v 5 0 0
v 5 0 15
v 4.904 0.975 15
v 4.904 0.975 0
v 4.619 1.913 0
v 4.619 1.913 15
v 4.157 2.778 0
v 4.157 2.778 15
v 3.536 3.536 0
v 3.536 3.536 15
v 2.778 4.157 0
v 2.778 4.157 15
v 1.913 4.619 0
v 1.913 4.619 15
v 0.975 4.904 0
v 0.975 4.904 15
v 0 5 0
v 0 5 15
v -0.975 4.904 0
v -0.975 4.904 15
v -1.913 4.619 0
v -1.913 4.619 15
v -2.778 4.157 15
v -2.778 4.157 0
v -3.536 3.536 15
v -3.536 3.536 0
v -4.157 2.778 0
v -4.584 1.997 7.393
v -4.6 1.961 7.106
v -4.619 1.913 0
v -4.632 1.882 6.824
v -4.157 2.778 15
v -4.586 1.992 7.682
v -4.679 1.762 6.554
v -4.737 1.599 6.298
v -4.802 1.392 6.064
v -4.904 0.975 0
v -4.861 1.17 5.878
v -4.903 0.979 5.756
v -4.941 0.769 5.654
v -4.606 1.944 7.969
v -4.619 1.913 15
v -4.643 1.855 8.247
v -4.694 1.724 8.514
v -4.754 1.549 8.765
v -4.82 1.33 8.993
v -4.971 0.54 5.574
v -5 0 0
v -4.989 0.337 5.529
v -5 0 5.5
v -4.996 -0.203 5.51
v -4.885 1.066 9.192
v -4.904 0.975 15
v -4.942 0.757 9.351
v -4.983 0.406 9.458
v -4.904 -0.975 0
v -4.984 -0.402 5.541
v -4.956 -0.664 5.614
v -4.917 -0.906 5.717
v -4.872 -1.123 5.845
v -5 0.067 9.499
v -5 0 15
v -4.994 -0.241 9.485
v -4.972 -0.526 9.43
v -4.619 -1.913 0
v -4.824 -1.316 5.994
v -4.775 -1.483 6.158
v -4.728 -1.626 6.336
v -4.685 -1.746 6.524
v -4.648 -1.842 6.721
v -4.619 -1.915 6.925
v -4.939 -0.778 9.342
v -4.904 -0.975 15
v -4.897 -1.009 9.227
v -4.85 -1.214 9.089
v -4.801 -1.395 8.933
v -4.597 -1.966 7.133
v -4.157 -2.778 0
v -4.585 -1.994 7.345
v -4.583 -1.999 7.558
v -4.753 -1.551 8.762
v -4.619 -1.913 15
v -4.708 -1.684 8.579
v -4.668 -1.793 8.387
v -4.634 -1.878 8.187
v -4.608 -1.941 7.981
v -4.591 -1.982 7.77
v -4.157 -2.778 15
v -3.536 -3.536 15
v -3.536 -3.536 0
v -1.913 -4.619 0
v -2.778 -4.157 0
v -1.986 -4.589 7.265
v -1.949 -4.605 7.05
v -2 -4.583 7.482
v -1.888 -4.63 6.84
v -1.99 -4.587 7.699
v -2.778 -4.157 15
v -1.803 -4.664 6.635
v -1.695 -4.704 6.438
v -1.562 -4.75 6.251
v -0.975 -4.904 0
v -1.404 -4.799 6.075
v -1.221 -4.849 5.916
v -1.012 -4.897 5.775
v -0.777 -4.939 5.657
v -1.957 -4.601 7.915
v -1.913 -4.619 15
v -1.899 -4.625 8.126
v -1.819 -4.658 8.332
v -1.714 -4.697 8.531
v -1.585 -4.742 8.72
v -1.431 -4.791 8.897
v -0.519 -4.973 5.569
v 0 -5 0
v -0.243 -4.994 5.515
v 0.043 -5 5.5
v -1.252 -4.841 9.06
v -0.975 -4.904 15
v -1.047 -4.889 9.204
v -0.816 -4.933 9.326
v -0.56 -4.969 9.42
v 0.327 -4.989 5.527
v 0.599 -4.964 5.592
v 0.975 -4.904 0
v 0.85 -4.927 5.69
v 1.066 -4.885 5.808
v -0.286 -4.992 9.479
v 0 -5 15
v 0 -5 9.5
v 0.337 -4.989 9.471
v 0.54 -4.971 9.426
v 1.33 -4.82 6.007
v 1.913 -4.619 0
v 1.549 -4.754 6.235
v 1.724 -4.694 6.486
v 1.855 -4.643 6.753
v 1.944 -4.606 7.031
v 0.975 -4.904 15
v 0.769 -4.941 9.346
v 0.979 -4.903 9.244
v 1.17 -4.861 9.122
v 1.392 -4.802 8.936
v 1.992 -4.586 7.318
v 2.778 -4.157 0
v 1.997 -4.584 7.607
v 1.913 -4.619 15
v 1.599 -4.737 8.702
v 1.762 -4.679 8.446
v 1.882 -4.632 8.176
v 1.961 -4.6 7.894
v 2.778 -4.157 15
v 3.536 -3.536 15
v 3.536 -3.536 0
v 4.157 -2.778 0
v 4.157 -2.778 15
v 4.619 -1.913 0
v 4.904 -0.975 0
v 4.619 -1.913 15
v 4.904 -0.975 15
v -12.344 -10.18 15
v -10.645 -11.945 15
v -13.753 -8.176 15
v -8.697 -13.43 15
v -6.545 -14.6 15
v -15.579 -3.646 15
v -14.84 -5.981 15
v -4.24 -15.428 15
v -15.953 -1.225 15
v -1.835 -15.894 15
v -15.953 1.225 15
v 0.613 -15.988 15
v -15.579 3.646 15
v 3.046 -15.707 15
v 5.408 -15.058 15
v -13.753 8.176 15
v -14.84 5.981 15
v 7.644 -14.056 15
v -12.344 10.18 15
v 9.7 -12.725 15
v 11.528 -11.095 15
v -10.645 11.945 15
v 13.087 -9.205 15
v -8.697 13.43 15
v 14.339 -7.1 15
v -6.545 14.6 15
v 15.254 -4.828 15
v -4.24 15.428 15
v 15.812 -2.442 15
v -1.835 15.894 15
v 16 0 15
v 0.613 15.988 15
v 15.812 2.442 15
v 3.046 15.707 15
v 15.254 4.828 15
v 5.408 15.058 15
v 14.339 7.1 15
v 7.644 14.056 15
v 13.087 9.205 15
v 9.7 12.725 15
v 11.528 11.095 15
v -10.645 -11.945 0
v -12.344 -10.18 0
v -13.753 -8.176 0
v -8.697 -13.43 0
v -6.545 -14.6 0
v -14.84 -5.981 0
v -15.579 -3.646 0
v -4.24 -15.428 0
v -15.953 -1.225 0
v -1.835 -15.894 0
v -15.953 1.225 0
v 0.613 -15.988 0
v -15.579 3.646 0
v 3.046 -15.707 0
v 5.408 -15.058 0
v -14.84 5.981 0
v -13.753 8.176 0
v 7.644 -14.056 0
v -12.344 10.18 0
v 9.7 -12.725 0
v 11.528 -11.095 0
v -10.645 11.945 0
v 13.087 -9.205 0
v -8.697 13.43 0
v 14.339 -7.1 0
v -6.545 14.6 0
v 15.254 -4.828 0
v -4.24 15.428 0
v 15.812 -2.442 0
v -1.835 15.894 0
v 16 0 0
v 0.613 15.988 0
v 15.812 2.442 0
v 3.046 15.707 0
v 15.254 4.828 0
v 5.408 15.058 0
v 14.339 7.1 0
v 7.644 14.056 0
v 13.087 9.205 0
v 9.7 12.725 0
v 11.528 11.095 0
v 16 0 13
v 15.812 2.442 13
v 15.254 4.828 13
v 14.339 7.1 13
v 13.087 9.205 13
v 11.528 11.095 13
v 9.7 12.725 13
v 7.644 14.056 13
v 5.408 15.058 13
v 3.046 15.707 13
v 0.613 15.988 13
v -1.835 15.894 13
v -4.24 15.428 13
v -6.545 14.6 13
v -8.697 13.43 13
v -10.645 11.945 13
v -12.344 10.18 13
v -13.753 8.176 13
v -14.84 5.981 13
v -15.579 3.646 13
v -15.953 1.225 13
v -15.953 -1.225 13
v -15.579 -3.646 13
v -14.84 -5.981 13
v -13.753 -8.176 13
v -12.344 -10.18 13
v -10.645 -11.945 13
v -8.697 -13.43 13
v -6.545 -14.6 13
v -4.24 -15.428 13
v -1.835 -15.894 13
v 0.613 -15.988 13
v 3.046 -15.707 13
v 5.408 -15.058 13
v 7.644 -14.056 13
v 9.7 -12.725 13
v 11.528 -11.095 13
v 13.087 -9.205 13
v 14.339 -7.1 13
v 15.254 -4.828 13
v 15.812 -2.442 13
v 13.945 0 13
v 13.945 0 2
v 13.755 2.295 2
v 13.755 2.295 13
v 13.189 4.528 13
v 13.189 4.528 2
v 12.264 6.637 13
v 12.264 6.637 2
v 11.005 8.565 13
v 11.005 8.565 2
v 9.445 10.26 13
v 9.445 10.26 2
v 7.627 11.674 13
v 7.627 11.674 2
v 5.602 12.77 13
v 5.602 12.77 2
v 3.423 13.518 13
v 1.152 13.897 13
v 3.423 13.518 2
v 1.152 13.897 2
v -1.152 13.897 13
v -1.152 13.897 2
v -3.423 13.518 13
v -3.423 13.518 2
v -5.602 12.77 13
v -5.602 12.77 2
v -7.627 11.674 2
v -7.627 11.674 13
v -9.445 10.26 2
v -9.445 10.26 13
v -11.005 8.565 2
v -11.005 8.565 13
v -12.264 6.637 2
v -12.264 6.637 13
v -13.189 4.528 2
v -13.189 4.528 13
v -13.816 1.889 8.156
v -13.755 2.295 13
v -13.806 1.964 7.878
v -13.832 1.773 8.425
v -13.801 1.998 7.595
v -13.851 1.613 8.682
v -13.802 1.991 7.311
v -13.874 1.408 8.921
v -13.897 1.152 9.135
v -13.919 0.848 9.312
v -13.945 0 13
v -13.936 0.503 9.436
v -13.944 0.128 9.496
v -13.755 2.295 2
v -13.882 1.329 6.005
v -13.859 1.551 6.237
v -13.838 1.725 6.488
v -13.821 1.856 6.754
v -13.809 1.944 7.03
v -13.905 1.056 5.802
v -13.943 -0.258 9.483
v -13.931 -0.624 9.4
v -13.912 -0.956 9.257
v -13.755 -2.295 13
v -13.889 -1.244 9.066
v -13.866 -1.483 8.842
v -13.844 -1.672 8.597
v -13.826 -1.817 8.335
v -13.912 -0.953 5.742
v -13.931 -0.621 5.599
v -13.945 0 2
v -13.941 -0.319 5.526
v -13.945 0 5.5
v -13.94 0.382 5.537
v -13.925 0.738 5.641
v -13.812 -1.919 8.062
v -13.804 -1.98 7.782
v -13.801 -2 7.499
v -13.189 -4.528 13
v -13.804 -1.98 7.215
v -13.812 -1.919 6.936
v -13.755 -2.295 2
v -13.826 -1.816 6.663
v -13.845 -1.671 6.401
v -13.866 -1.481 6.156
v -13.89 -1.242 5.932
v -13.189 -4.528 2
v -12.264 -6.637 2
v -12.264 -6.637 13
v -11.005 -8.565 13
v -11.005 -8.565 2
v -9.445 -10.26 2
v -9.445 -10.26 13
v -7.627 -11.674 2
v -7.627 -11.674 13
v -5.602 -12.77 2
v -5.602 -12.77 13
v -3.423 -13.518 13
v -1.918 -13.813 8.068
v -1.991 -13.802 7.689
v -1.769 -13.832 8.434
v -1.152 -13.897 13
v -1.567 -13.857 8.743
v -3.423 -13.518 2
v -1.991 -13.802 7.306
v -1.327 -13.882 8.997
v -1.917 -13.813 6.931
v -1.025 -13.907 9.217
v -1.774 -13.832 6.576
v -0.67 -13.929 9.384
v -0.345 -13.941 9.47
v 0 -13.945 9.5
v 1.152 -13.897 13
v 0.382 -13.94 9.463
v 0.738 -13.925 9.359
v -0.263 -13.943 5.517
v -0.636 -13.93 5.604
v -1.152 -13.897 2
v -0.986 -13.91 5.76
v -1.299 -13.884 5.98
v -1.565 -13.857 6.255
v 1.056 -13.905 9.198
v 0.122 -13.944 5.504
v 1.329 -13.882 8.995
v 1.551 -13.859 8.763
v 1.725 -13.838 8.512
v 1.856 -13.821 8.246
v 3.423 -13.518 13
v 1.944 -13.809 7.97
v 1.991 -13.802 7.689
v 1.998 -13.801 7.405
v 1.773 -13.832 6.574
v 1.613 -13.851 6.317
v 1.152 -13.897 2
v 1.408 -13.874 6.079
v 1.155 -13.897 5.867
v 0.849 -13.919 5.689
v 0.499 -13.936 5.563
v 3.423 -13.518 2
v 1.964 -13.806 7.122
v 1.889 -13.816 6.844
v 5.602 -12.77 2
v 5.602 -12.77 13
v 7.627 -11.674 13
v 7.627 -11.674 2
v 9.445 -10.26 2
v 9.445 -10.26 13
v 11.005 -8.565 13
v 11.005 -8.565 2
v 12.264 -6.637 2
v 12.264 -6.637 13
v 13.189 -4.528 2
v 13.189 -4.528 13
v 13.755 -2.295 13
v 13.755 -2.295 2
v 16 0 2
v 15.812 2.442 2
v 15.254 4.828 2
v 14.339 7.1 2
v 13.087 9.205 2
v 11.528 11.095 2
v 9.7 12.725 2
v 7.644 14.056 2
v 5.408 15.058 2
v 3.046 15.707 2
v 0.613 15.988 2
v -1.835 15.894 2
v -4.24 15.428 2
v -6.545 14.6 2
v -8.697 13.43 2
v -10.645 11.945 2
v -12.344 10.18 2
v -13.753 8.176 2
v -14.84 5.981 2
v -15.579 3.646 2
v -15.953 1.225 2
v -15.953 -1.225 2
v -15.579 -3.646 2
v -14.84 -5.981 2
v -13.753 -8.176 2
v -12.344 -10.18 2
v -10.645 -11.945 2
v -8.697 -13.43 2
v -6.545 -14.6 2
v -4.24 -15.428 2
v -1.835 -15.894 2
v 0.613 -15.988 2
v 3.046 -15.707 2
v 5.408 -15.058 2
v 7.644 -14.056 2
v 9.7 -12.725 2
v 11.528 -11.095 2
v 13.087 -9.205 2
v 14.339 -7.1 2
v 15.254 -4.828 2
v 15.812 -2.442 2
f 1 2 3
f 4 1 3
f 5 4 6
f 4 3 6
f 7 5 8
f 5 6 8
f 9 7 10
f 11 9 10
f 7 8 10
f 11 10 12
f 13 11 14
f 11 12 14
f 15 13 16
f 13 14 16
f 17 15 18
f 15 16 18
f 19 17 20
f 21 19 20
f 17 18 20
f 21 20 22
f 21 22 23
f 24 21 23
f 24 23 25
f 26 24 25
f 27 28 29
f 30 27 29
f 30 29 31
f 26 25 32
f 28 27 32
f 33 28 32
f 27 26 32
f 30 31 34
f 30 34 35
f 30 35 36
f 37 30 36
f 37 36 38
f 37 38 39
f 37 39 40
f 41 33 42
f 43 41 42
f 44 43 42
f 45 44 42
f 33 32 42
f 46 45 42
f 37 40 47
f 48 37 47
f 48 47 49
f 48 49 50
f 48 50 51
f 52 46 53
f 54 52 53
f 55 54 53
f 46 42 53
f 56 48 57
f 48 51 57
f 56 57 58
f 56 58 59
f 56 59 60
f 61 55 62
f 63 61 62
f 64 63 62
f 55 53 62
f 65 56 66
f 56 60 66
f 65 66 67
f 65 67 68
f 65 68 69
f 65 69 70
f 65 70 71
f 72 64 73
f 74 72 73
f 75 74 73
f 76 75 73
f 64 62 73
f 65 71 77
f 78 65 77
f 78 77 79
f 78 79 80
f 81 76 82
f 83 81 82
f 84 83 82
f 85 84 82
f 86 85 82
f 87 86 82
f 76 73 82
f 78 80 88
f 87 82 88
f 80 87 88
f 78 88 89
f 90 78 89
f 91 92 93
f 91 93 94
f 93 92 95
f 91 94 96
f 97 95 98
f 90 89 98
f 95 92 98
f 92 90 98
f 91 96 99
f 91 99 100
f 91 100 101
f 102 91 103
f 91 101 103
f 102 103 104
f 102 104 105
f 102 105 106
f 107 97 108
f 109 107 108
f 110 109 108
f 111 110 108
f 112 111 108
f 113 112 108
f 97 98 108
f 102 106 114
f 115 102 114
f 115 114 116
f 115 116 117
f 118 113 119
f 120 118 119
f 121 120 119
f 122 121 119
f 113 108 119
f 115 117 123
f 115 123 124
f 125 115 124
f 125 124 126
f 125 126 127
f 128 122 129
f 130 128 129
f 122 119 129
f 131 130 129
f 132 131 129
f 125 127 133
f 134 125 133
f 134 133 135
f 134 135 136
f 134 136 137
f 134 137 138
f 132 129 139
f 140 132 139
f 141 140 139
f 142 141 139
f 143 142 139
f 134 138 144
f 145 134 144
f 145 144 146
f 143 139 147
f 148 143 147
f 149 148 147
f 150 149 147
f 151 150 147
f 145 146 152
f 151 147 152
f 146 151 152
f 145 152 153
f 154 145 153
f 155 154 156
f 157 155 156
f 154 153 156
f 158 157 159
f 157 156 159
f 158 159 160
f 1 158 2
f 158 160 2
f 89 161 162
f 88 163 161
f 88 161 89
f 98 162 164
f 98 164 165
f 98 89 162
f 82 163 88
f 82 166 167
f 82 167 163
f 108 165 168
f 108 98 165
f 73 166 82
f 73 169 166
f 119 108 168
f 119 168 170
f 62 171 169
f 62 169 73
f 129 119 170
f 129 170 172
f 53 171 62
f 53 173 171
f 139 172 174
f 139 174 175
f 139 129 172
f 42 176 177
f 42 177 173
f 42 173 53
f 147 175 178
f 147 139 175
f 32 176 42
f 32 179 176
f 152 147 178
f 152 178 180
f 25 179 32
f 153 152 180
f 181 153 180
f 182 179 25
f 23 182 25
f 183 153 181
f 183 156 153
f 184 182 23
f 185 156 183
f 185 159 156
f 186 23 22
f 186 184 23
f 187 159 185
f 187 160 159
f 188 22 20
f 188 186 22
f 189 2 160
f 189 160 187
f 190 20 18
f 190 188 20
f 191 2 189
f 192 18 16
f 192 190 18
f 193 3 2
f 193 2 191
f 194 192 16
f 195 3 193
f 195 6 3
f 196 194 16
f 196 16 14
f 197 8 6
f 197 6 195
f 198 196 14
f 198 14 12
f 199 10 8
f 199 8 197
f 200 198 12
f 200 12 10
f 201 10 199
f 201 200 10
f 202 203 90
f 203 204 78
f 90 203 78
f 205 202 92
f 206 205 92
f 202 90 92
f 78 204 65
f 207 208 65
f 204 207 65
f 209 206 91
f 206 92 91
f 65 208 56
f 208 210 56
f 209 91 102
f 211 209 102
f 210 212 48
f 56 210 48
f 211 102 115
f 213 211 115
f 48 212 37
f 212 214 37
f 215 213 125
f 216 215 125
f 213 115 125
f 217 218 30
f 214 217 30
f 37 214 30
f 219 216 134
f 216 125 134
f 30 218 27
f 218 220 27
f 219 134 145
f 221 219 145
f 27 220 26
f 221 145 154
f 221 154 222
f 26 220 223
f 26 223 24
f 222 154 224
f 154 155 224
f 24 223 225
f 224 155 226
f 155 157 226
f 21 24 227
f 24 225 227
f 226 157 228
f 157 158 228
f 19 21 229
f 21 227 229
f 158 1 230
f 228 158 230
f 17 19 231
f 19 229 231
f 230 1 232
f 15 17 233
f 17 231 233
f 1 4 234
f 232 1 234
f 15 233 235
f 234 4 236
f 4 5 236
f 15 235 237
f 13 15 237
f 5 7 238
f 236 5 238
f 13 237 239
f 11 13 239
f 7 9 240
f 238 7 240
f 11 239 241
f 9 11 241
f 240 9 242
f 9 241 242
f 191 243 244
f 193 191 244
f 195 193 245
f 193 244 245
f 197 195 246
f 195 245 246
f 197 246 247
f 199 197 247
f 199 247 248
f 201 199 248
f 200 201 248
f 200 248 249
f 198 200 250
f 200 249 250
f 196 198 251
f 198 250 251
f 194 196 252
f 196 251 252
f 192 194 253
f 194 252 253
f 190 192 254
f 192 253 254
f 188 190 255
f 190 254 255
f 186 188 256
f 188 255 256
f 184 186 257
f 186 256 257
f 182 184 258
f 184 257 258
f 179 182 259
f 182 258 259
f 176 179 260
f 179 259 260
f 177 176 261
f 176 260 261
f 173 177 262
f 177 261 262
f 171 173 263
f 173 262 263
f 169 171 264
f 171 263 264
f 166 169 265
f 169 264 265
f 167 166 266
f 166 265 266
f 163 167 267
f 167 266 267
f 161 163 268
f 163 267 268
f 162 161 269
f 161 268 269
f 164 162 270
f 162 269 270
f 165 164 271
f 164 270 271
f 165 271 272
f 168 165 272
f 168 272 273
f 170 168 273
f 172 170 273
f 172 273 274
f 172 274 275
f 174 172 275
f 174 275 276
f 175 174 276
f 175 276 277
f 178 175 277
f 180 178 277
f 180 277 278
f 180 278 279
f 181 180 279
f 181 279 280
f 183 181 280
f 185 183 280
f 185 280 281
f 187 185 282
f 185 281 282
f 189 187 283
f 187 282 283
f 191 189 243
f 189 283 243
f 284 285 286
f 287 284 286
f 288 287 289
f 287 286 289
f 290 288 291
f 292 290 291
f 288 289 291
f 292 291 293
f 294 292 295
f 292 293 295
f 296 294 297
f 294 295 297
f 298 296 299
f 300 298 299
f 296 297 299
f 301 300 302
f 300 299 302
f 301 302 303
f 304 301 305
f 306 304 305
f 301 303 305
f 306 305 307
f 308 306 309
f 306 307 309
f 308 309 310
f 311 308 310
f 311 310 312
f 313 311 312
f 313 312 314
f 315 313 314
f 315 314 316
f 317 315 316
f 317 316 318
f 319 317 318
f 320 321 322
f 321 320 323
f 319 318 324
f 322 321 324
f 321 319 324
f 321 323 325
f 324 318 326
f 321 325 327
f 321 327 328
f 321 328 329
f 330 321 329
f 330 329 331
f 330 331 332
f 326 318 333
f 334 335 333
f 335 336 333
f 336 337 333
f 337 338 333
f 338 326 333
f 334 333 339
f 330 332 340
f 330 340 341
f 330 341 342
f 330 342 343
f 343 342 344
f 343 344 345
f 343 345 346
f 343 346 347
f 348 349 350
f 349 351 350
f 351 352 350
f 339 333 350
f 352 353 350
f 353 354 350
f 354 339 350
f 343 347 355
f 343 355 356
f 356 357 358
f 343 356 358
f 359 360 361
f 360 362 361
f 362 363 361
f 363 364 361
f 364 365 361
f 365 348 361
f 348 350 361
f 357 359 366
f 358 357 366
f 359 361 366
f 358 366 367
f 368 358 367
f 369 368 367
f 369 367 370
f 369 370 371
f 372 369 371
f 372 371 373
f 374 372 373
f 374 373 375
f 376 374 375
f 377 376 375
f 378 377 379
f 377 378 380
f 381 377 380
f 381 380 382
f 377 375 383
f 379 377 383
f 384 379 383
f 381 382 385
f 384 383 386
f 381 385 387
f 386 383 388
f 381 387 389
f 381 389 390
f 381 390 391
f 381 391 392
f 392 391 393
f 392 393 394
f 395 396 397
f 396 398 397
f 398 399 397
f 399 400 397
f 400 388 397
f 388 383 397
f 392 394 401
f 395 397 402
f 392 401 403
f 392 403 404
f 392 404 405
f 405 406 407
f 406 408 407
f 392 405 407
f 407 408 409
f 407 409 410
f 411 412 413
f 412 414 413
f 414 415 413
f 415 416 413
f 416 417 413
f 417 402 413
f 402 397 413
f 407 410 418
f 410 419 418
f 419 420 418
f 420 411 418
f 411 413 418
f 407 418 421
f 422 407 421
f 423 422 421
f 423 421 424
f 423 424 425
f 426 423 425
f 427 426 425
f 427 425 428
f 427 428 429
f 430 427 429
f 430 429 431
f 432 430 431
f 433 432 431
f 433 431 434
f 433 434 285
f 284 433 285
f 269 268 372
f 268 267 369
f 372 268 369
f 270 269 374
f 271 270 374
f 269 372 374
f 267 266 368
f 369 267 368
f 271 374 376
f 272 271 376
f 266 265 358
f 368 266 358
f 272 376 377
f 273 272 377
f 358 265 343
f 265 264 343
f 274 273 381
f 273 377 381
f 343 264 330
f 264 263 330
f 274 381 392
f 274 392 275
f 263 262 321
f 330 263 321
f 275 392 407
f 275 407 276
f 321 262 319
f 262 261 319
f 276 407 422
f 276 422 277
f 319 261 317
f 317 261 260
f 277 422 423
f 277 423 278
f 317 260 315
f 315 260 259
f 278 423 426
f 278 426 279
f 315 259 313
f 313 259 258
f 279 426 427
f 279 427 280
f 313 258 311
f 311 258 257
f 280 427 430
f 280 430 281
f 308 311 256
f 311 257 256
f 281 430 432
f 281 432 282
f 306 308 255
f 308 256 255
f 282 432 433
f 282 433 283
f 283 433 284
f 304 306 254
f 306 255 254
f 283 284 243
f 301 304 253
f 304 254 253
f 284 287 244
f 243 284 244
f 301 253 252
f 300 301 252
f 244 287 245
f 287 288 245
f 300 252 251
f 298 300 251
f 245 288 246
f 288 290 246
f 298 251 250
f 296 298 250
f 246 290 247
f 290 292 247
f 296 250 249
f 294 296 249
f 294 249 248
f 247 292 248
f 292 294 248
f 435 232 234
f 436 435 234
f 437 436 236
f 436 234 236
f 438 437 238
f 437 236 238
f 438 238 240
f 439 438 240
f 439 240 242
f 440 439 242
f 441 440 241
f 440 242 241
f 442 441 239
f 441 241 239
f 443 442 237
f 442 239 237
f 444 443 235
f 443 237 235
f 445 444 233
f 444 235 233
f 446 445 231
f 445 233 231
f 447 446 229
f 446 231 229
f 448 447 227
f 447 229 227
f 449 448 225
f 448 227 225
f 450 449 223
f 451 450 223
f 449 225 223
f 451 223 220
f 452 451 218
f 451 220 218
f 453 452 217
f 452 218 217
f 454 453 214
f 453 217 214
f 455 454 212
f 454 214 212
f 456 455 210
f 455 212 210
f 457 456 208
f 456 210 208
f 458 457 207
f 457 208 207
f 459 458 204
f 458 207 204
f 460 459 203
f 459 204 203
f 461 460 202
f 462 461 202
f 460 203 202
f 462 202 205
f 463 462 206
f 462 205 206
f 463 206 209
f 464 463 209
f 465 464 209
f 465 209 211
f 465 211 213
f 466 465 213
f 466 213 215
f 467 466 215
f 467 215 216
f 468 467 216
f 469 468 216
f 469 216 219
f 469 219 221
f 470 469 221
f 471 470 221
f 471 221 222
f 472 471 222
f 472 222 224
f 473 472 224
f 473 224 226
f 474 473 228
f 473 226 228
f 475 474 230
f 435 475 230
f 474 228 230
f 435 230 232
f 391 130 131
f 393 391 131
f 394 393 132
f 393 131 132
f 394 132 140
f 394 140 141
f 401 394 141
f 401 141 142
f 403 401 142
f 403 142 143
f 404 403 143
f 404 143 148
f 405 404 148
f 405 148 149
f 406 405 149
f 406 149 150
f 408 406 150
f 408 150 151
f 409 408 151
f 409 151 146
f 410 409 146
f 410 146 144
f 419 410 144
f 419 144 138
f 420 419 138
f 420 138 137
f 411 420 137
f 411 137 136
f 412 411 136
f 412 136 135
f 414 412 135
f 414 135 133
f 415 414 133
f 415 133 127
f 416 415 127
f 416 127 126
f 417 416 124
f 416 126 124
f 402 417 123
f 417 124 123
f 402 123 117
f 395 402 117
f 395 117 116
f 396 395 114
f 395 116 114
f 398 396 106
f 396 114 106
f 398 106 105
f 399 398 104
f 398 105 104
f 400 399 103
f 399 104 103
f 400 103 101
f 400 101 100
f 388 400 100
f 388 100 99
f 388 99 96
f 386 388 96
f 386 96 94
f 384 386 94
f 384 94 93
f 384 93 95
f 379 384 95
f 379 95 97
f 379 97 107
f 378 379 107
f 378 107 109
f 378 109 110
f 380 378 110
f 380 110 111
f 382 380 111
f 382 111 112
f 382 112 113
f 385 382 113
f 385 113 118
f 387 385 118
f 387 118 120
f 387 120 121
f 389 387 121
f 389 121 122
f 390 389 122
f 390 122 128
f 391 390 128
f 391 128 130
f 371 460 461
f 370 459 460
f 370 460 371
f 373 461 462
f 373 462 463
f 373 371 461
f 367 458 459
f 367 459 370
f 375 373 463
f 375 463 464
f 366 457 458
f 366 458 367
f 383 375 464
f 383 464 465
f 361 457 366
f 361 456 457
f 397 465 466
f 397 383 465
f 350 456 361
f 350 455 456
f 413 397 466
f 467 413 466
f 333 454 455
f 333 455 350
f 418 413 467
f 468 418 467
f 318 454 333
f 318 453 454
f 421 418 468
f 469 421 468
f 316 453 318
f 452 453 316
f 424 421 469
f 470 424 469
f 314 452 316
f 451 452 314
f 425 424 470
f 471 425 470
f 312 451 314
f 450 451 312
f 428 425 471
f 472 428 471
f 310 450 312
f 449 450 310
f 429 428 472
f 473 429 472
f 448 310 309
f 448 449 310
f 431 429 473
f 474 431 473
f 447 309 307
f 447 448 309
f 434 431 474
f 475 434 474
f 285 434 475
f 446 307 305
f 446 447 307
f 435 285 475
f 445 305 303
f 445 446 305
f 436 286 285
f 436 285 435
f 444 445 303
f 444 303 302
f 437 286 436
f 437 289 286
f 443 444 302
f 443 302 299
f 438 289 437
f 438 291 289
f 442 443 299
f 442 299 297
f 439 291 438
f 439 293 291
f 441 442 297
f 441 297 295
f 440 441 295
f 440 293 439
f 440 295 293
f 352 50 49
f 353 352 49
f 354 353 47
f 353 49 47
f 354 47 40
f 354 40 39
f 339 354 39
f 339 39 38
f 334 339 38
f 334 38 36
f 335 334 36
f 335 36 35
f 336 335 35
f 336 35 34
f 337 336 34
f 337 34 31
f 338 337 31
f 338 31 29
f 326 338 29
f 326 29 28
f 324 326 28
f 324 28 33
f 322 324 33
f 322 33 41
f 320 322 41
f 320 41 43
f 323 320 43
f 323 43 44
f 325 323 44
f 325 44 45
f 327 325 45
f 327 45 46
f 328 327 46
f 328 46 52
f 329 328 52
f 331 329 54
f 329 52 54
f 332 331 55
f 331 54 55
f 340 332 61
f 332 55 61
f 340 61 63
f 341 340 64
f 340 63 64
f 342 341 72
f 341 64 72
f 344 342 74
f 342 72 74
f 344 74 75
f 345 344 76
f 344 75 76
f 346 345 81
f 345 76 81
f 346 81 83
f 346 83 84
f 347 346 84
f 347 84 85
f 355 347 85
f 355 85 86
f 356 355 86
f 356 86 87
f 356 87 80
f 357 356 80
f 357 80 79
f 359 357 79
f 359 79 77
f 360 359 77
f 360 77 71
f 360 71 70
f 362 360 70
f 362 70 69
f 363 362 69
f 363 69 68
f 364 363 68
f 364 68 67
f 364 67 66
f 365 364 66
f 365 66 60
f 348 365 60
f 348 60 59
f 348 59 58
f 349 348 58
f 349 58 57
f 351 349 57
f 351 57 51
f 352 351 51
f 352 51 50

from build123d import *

# Parameters (mm, degrees)
SKETCH_1_R          = 16
EXTRUDE_1_DEPTH     = 2
SKETCH_2_R          = 13.945
EXTRUDE_2_DEPTH     = 11
SKETCH_3_R          = 16
EXTRUDE_3_DEPTH     = 2
SKETCH_4_R          = 5
CUT_EXTRUDE_1_DEPTH = 15
SKETCH_5_R          = 2
CUT_EXTRUDE_2_DEPTH = 20
SKETCH_8_R          = 2
CUT_EXTRUDE_3_DEPTH = 20


with BuildPart() as part:
    # 草图1 → 凸台-拉伸1 (new body)
    with BuildSketch(Plane.XY):
        Circle(SKETCH_1_R)
    extrude(amount=EXTRUDE_1_DEPTH)

    # 草图2 → 凸台-拉伸2 (add)
    with BuildSketch(Plane.XY.offset(2)):
        Circle(SKETCH_2_R)
    extrude(amount=EXTRUDE_2_DEPTH)

    # 草图3 → 凸台-拉伸3 (add)
    with BuildSketch(Plane.XY.offset(13)):
        Circle(SKETCH_3_R)
    extrude(amount=EXTRUDE_3_DEPTH)

    # 草图4 → 切除-拉伸1 (cut)
    with BuildSketch(Plane.XY.offset(15)):
        Circle(SKETCH_4_R)
    extrude(amount=-CUT_EXTRUDE_1_DEPTH, mode=Mode.SUBTRACT)

    # 草图5 → 切除-拉伸2 (cut)
    with BuildSketch(Plane(origin=(0, 0, 0), x_dir=(1, 0, 0), z_dir=(0, 1, 0))):
        with Locations(Location((0, -7.5, 0), (0, 0, 270))):
            Circle(SKETCH_5_R)
    extrude(amount=-CUT_EXTRUDE_2_DEPTH, mode=Mode.SUBTRACT)

    # 草图8 → 切除-拉伸3 (cut)
    with BuildSketch(Plane(origin=(0, 0, 0), x_dir=(0, 0, -1), z_dir=(1, 0, 0))):
        with Locations((-7.5, 0)):
            Circle(SKETCH_8_R)
    extrude(amount=-CUT_EXTRUDE_3_DEPTH, mode=Mode.SUBTRACT)


solid = part.part
